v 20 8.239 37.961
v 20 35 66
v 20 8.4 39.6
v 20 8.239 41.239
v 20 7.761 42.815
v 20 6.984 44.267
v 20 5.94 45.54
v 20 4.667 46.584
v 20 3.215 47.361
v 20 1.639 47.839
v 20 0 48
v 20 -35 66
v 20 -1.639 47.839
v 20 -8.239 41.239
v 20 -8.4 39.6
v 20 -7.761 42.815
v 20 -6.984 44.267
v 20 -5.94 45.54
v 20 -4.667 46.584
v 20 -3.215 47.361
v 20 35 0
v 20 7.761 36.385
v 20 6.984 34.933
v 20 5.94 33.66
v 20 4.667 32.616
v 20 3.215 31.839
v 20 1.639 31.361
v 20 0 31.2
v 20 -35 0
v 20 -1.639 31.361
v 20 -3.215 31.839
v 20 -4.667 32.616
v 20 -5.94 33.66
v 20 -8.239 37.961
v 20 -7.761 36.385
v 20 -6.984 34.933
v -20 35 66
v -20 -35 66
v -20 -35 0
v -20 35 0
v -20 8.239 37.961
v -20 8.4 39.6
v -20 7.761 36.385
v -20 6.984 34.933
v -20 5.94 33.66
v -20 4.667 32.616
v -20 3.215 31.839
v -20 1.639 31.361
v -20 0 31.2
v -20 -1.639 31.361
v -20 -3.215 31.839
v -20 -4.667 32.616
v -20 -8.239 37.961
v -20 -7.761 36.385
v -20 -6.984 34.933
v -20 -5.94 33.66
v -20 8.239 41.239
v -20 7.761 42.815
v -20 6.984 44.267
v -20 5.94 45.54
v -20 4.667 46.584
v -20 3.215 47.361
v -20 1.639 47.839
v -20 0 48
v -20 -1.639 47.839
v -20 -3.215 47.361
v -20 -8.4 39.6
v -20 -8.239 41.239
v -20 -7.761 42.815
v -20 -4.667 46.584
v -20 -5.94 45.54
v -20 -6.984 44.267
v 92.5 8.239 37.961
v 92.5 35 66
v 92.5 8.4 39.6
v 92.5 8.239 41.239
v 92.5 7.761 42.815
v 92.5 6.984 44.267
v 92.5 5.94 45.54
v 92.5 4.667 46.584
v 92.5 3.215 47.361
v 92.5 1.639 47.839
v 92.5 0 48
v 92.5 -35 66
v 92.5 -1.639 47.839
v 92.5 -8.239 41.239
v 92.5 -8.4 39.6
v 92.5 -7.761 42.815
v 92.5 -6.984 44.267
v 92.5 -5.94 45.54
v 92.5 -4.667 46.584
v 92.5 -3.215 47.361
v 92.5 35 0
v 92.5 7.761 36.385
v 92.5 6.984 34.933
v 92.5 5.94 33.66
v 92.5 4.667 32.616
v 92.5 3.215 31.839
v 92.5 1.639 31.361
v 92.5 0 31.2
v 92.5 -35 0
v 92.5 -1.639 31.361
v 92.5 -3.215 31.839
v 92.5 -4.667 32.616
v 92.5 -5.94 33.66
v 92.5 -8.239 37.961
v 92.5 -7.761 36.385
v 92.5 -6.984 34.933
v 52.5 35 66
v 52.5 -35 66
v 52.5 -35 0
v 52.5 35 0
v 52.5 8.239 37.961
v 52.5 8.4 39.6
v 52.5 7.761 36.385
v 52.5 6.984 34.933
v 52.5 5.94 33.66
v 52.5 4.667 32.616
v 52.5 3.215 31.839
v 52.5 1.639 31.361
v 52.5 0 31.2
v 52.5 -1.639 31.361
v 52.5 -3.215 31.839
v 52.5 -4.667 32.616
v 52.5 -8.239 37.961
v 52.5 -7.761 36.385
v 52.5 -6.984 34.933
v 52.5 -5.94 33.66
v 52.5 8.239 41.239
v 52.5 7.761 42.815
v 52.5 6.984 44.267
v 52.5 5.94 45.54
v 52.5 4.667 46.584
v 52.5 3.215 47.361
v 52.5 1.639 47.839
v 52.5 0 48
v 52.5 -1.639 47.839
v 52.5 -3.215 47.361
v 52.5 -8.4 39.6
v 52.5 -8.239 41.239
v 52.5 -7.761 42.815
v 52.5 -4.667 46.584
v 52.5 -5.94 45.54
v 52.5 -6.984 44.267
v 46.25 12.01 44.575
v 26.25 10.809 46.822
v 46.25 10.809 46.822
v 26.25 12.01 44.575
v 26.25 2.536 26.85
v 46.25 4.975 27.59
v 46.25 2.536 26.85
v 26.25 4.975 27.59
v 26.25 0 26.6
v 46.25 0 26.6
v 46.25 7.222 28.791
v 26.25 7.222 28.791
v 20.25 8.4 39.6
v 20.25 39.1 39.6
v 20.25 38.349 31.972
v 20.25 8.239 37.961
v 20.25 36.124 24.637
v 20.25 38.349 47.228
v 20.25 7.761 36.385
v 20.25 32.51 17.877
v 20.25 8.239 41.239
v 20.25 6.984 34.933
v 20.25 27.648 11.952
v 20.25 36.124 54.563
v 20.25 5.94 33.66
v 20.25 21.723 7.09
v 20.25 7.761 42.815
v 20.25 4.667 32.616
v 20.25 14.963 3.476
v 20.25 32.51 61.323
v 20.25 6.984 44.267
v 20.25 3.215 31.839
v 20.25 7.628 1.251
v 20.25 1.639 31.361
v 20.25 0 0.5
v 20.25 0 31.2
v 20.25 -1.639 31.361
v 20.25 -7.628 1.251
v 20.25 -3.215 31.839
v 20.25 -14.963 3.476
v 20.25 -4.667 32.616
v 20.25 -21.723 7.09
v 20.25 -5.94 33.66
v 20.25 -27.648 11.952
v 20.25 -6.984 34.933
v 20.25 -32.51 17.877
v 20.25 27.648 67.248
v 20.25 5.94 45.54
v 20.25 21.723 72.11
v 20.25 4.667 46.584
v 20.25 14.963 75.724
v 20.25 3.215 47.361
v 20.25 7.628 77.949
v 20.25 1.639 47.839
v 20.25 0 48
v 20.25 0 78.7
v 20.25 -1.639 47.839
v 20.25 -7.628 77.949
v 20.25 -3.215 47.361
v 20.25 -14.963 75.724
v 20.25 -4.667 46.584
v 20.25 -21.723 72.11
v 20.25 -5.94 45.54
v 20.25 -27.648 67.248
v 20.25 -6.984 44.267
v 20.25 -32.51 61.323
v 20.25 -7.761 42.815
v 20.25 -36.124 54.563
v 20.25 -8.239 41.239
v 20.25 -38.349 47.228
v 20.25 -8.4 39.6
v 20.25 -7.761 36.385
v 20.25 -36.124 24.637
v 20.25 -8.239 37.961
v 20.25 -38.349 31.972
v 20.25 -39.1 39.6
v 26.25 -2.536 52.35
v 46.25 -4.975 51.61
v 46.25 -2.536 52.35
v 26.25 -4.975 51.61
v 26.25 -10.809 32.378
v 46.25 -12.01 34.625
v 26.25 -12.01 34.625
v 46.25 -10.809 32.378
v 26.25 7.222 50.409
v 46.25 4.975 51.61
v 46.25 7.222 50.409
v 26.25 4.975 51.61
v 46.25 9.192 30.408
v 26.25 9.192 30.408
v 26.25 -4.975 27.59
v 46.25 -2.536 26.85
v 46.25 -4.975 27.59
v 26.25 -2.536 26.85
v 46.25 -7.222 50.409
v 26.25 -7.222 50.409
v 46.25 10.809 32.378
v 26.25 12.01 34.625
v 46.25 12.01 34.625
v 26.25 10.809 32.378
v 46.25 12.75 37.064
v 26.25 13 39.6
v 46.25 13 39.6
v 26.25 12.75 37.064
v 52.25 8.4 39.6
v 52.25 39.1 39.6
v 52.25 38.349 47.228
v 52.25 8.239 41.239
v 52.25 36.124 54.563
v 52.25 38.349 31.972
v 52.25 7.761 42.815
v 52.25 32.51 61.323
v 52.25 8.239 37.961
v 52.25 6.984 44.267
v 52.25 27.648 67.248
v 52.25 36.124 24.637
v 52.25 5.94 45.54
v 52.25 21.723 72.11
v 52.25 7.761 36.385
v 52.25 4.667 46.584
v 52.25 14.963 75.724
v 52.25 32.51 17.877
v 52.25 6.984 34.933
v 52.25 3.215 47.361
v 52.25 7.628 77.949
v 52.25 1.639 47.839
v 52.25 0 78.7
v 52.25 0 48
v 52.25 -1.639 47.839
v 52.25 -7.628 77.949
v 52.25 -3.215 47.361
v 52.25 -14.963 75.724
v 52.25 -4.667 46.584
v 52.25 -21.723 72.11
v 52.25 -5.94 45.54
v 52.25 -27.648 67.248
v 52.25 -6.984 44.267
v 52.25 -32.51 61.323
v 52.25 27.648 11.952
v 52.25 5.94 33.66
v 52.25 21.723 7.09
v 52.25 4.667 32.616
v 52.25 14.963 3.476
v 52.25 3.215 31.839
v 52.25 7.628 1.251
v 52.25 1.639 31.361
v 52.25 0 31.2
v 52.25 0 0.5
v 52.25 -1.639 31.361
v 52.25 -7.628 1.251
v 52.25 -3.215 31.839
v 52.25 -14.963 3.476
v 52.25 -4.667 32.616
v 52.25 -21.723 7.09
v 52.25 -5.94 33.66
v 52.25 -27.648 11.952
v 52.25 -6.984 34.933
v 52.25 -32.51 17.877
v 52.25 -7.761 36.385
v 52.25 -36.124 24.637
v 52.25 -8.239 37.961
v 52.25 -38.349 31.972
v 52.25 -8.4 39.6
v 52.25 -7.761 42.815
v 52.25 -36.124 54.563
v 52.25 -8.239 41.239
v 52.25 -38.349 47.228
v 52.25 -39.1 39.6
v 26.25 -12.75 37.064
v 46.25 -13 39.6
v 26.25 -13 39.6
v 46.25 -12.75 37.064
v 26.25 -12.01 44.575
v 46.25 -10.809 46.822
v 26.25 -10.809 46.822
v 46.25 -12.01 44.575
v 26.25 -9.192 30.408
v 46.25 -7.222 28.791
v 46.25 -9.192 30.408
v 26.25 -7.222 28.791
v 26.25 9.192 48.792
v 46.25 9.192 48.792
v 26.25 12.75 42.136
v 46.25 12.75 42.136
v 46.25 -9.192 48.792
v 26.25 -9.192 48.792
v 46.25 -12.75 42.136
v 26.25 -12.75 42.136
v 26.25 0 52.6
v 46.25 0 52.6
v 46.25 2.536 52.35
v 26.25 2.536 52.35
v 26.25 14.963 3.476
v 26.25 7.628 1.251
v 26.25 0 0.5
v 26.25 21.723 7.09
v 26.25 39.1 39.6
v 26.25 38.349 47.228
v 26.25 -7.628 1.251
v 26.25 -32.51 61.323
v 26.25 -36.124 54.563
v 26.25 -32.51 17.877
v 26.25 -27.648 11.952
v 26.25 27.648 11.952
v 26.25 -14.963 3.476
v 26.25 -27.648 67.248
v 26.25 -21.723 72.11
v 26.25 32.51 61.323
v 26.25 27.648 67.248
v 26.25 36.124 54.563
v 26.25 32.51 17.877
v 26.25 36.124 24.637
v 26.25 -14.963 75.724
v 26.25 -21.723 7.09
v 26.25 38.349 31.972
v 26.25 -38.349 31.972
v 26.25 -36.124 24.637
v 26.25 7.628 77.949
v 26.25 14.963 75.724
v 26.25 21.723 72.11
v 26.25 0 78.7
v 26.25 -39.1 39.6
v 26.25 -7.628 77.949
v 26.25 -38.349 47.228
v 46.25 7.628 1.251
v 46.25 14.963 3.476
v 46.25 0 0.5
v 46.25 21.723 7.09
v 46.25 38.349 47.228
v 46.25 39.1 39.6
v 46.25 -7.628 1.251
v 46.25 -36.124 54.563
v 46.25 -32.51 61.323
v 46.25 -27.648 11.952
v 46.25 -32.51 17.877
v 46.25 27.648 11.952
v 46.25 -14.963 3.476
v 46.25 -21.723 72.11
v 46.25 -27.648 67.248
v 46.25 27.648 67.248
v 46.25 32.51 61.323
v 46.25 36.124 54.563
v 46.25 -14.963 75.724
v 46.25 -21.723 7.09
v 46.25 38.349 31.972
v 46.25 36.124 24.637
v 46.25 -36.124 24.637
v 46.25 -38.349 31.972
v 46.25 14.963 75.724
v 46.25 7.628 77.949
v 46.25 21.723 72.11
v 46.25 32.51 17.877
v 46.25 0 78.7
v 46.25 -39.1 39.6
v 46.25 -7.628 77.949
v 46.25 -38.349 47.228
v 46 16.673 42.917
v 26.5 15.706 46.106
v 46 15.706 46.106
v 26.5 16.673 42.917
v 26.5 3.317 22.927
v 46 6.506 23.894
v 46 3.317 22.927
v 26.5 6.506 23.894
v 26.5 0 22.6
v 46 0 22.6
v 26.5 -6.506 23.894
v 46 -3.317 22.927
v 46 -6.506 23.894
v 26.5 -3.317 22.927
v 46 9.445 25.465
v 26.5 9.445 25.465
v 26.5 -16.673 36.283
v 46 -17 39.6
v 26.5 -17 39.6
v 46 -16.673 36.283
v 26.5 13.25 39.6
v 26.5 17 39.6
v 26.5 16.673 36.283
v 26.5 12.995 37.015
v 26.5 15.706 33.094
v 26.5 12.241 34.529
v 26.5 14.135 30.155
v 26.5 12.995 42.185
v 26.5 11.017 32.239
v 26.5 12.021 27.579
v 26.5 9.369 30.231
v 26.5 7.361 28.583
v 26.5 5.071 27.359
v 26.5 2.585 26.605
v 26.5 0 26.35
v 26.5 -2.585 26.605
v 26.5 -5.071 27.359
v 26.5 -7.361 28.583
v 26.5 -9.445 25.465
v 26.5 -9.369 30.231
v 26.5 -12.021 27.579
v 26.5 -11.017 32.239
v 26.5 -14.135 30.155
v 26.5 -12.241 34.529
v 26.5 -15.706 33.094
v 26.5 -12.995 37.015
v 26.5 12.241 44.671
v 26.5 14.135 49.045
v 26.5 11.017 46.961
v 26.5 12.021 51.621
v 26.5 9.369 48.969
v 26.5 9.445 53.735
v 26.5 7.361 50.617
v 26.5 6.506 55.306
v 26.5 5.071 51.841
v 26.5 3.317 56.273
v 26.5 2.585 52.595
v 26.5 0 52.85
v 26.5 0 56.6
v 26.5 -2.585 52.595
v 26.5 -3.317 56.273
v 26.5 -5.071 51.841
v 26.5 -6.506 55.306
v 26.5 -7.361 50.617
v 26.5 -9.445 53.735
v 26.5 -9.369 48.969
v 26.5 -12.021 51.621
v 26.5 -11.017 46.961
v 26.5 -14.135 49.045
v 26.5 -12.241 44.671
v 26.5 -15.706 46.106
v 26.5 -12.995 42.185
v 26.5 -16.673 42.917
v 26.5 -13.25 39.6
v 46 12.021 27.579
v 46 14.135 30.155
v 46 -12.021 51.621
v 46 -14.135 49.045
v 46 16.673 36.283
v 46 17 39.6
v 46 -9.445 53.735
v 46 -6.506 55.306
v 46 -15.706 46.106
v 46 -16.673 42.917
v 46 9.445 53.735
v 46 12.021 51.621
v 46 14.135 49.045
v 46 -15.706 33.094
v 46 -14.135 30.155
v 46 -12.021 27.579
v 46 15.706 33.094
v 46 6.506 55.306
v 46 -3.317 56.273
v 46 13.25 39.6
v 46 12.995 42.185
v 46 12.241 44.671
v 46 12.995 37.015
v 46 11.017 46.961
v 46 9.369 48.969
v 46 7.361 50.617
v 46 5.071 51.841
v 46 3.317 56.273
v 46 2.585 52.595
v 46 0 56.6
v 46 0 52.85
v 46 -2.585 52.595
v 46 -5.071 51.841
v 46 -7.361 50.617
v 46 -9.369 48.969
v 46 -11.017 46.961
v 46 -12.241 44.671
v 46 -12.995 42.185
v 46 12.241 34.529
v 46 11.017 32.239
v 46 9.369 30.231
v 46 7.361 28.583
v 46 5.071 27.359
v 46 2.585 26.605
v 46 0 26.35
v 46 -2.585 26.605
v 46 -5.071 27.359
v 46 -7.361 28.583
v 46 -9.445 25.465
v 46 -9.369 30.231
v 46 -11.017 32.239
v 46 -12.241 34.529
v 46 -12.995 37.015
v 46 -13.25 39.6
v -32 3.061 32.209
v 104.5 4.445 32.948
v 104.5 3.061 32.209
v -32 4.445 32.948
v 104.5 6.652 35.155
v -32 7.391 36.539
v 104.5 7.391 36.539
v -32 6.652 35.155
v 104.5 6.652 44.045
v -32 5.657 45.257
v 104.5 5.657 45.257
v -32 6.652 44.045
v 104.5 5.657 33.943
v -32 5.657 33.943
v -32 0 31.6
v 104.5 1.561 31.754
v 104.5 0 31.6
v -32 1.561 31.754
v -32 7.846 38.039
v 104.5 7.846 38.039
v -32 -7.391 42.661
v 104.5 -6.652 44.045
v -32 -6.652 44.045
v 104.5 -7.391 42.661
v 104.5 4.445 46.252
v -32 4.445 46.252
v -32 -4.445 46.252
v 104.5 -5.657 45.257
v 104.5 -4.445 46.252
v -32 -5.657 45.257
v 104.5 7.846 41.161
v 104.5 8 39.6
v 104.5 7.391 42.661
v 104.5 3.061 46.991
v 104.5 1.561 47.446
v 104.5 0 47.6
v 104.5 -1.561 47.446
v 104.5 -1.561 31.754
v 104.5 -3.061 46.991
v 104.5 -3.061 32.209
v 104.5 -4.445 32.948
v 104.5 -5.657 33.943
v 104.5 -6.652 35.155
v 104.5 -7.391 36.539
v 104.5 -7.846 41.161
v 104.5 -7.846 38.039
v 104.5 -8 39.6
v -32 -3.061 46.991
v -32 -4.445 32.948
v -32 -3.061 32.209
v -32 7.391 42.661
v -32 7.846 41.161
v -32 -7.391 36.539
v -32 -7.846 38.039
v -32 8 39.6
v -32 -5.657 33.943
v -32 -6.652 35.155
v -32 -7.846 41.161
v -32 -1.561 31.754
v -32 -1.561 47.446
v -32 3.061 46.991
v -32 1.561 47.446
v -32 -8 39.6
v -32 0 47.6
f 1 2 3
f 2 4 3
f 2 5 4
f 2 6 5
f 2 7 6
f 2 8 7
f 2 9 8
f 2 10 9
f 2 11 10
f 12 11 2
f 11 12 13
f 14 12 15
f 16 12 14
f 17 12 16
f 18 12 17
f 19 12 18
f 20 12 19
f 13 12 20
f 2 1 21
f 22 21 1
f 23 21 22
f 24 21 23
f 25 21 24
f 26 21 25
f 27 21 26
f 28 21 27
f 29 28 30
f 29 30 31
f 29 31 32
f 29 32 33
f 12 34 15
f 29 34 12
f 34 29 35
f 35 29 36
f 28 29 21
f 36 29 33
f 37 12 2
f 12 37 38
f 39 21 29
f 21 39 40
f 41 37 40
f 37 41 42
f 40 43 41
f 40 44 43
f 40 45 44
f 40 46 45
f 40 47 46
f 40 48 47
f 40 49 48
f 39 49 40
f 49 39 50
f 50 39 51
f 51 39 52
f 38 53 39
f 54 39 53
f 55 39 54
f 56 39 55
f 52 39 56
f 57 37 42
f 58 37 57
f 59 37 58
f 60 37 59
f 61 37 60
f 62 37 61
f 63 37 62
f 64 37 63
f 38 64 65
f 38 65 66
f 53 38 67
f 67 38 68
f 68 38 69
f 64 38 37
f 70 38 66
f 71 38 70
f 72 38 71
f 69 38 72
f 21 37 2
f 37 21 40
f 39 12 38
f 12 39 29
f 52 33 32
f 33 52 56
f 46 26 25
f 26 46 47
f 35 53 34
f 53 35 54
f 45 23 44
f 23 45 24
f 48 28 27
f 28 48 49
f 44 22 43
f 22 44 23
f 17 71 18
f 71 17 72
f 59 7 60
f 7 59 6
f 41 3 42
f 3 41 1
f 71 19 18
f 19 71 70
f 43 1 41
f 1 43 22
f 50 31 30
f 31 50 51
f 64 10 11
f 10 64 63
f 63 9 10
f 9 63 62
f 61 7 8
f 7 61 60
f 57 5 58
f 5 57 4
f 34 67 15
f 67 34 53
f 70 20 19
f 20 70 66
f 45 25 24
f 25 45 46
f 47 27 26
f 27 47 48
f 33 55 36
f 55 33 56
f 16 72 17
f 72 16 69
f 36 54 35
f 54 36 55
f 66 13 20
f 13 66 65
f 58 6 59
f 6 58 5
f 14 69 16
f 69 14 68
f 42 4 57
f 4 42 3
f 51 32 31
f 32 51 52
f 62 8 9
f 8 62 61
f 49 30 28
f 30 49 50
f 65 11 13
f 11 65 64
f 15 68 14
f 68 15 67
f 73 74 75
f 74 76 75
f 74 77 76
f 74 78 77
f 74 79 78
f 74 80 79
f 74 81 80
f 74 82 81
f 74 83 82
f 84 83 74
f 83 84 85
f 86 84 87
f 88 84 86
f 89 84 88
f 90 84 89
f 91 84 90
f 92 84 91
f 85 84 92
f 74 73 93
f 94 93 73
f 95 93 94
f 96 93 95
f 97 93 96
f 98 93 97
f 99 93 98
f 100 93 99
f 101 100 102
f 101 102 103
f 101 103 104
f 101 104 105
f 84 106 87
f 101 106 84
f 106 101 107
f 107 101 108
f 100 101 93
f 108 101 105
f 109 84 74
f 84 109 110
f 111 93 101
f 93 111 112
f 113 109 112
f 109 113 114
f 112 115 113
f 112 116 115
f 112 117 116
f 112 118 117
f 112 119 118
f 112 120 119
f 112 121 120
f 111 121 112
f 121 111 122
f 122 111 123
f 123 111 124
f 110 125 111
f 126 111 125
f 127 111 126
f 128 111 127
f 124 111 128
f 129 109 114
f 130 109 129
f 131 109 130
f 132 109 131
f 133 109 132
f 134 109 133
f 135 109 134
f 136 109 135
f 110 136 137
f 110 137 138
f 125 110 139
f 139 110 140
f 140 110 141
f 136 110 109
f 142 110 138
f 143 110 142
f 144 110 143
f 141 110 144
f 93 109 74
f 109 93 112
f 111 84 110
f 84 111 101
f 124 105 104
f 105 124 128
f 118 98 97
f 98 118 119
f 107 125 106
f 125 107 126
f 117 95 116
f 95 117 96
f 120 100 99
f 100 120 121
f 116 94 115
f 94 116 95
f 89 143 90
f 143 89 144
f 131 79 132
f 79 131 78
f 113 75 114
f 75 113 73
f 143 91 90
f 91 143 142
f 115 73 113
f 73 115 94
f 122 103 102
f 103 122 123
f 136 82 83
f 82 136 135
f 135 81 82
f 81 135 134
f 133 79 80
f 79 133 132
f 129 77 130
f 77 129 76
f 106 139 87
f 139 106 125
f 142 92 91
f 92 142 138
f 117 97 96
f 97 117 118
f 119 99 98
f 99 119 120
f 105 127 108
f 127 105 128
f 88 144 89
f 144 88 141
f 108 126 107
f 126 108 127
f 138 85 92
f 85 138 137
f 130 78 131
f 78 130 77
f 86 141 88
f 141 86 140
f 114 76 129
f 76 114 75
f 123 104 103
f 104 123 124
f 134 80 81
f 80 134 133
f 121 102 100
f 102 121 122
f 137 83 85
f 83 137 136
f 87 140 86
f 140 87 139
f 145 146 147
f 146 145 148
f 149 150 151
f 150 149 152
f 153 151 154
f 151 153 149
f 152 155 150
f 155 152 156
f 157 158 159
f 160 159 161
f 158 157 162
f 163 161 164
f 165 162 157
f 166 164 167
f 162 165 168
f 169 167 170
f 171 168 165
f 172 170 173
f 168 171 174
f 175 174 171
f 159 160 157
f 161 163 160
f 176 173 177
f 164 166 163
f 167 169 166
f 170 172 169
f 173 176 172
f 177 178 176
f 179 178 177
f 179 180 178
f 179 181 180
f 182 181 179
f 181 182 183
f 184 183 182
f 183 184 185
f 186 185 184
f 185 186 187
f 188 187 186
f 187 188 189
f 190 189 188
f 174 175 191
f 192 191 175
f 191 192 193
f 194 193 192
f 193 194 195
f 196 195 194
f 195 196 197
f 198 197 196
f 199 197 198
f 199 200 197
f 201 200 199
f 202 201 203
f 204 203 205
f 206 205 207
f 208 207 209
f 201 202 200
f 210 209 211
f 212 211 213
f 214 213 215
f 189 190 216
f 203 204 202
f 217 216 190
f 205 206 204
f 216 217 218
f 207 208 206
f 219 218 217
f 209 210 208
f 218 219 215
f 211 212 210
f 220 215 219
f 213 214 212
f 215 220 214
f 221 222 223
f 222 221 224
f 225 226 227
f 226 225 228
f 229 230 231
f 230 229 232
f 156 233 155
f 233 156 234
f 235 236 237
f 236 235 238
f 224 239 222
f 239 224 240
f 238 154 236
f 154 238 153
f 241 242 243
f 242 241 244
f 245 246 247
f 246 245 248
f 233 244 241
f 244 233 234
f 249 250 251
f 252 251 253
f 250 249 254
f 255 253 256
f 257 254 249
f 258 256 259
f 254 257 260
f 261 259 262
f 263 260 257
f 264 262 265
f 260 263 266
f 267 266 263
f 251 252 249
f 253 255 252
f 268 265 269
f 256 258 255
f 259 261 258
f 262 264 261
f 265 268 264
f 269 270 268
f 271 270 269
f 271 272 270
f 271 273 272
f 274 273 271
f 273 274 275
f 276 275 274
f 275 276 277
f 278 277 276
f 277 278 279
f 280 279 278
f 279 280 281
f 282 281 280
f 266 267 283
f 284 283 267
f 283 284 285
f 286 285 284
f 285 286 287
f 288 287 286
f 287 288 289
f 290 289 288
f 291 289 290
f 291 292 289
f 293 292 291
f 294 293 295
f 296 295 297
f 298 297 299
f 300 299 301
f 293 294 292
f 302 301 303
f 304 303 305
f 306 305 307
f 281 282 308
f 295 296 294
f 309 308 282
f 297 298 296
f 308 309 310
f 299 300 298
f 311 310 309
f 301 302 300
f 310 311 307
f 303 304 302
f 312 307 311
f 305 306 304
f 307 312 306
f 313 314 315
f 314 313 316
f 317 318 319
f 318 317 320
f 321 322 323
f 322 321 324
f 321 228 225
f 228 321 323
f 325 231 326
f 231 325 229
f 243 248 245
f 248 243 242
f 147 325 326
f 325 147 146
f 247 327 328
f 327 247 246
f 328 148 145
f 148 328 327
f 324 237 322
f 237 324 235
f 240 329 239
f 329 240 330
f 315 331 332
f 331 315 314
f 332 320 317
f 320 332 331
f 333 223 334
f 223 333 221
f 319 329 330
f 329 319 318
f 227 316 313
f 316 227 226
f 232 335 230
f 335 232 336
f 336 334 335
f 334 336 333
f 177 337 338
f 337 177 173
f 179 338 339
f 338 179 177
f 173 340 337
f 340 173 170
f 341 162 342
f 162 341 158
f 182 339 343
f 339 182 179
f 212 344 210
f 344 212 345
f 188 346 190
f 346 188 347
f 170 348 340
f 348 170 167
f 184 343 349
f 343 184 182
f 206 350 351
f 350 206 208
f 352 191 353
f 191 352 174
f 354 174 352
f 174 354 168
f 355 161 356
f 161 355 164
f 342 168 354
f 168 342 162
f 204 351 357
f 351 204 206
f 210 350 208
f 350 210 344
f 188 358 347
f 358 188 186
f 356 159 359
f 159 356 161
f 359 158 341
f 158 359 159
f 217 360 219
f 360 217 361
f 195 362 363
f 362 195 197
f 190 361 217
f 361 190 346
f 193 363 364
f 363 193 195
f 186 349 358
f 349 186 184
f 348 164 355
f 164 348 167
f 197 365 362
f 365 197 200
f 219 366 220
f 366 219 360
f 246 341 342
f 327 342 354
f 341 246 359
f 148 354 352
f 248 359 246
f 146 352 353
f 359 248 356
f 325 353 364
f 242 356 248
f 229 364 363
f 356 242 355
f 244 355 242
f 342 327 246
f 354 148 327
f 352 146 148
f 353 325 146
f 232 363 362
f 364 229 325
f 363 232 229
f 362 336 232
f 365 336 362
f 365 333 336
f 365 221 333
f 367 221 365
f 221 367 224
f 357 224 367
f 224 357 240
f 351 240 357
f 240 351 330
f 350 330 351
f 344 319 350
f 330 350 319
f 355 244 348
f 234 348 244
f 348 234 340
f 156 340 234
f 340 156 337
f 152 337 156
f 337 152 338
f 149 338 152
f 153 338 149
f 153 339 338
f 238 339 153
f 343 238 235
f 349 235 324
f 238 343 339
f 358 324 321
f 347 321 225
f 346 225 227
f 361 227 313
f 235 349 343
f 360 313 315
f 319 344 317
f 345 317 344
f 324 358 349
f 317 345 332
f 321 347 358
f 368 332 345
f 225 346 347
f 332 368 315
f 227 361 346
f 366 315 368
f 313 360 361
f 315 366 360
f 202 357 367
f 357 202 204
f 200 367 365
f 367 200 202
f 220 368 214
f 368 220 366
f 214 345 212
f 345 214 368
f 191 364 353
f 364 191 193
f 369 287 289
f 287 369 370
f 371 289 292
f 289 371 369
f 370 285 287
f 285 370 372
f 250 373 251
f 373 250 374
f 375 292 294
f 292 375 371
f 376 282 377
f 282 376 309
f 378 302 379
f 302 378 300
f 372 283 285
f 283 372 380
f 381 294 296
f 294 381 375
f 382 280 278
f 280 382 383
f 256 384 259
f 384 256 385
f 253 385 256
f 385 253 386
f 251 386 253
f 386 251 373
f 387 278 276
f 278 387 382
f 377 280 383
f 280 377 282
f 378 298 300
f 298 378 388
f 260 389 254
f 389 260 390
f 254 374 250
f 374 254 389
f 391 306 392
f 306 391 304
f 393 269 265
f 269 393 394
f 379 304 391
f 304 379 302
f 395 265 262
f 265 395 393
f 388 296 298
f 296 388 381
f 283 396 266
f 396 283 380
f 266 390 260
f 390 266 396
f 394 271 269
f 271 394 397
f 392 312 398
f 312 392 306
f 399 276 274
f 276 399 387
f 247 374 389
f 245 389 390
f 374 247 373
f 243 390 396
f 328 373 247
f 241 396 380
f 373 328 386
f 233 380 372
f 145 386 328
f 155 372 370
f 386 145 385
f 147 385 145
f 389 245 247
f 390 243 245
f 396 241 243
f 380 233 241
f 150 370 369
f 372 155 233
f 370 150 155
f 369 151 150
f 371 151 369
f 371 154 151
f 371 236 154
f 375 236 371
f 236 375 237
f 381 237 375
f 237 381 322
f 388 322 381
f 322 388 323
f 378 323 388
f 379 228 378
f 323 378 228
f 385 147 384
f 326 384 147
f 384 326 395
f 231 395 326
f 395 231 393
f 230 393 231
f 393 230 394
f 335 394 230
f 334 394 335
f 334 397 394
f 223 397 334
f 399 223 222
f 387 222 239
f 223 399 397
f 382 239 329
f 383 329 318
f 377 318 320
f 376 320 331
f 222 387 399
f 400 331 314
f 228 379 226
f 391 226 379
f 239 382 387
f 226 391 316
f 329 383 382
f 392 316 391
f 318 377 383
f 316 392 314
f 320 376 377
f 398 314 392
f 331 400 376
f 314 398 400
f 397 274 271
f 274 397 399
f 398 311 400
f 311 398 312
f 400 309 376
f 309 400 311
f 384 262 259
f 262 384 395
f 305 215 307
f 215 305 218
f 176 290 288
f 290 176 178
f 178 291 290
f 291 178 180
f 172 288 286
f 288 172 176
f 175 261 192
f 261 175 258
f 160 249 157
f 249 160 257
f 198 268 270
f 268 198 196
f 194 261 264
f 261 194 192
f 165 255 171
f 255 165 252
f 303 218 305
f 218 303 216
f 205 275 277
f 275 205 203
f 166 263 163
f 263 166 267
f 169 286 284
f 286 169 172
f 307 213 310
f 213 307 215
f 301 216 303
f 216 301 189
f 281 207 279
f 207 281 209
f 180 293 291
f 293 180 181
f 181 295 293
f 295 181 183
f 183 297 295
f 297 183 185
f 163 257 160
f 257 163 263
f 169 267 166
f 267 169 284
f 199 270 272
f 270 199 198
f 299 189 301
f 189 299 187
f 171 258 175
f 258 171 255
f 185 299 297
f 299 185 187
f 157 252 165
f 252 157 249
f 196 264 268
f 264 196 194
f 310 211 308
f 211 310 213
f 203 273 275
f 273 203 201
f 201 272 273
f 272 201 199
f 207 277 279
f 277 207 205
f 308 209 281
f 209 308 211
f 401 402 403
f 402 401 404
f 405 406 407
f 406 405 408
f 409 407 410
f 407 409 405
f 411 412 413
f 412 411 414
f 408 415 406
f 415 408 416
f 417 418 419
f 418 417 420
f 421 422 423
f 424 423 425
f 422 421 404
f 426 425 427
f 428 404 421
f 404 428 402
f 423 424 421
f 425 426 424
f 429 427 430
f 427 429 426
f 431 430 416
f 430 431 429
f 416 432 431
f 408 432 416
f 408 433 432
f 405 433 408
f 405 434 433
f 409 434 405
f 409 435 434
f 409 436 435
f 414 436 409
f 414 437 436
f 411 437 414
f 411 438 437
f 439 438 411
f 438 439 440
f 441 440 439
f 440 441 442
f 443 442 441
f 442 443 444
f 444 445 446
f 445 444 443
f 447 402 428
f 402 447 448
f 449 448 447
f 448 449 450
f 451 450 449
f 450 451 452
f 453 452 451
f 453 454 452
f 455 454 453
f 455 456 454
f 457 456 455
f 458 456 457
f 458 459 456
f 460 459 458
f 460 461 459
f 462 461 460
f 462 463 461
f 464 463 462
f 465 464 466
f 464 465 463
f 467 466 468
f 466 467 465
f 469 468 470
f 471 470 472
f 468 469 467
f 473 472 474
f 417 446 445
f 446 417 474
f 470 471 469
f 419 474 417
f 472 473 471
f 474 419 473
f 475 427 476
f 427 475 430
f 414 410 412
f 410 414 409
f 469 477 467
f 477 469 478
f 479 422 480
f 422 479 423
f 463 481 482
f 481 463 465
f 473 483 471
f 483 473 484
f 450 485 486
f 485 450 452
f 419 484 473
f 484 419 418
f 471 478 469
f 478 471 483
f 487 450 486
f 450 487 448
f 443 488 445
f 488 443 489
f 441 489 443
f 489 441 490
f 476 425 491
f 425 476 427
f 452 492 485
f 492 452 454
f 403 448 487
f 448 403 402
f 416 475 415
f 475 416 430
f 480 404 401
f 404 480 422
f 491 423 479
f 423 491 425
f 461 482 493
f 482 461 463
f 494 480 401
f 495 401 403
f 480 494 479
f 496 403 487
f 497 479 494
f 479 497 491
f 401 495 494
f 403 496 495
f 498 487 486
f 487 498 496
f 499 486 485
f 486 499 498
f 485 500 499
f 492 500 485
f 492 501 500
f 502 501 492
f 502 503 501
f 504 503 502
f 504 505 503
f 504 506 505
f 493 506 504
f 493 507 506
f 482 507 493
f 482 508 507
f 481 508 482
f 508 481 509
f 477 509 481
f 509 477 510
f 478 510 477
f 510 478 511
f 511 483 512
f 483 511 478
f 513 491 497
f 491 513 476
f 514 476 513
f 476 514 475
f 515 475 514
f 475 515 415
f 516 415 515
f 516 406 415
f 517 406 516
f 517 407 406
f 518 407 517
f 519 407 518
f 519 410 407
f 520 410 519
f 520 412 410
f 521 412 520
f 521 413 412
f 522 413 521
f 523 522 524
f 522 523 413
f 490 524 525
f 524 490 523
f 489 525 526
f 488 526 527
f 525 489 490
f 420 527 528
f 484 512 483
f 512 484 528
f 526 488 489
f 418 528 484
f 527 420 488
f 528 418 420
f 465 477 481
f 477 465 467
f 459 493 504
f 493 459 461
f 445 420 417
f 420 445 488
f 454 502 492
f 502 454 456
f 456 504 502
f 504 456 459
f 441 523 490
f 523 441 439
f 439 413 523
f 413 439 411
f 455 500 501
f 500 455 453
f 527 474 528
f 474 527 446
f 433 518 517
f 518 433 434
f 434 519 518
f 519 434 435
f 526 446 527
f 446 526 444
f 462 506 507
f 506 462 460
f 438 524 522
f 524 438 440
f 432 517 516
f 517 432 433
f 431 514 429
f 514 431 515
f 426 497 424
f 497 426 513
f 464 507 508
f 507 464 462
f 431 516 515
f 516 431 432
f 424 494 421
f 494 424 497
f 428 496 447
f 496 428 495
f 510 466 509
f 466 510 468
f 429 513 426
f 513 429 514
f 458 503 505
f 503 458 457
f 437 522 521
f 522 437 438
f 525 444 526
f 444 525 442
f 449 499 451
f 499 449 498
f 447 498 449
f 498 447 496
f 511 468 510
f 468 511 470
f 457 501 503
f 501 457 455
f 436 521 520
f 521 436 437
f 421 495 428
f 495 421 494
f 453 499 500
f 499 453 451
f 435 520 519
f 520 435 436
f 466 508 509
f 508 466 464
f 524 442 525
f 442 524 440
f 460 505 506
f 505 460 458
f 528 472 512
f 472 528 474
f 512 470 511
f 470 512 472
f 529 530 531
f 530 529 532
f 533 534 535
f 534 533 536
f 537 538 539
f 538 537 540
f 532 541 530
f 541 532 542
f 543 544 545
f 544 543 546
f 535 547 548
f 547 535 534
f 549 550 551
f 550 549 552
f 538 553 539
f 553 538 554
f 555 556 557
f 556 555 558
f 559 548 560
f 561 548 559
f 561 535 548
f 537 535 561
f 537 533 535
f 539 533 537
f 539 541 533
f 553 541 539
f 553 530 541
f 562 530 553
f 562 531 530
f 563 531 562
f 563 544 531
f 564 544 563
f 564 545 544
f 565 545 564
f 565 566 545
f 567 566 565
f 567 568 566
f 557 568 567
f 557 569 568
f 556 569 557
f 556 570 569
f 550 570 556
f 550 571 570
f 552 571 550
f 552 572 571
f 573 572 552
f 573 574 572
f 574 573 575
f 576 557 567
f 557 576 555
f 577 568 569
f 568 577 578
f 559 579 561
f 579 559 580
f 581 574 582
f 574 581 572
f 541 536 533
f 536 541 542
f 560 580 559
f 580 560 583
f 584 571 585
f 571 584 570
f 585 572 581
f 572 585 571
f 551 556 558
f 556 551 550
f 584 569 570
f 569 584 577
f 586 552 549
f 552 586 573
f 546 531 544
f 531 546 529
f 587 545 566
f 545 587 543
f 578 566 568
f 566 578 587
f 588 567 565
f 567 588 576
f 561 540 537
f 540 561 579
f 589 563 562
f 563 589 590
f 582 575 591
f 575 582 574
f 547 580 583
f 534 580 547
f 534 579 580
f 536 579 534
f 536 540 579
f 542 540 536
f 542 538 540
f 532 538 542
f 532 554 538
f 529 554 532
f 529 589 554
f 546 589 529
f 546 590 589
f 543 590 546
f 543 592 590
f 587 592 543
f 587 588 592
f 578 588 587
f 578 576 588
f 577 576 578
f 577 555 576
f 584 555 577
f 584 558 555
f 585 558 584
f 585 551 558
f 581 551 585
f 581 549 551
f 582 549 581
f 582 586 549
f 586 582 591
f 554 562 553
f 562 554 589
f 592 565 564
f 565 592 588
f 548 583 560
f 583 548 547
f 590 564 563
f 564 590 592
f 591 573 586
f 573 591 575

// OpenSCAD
$fn = 32;

// ------------------------------------------------------------------------
// Pulley assembly: d78.2 pulley with a belt, shaft d16
// Every part is its own module, assembly() places them once.
// ------------------------------------------------------------------------

// --- part 1 ---
module support1() {
  difference() {
    translate([-20, -35, 0]) cube([40, 70, 66]);
    translate([0, 0, 39.6]) rotate([0, 90, 0]) cylinder(h = 42, d = 16.8, center = true);
  }
}

// --- part 2 ---
module support2() {
  difference() {
    translate([-20, -35, 0]) cube([40, 70, 66]);
    translate([0, 0, 39.6]) rotate([0, 90, 0]) cylinder(h = 42, d = 16.8, center = true);
  }
}

// --- part 3 ---
module shaft() {
  translate([0, 0, -68.25]) cylinder(h = 136.5, d = 16);
}

// --- part 4 ---
module pulley() {
  difference() {
    union() {
      cylinder(h = 32, d = 26);
      cylinder(h = 6, d = 78.2);
      translate([0, 0, 26]) cylinder(h = 6, d = 78.2);
    }
    translate([0, 0, -1]) cylinder(h = 34, d = 16.8);
  }
}

// --- part 5 ---
module belt() {
  difference() {
      translate([0, 0, 0]) cylinder(h = 19.5, d = 34);
      translate([0, 0, -1]) cylinder(h = 21.5, d = 26.5);
    }
}

// --- assembly ---
module assembly() {
  translate([0, 0, 0]) rotate([0, 0, 0]) support1();
  translate([72.5, 0, 0]) rotate([0, 0, 0]) support2();
  translate([36.25, 0, 39.6]) rotate([0, 90, 0]) shaft();
  translate([20.25, 0, 39.6]) rotate([0, 90, 0]) pulley();
  translate([26.5, 0, 39.6]) rotate([0, 90, 0]) belt();
}

assembly();
